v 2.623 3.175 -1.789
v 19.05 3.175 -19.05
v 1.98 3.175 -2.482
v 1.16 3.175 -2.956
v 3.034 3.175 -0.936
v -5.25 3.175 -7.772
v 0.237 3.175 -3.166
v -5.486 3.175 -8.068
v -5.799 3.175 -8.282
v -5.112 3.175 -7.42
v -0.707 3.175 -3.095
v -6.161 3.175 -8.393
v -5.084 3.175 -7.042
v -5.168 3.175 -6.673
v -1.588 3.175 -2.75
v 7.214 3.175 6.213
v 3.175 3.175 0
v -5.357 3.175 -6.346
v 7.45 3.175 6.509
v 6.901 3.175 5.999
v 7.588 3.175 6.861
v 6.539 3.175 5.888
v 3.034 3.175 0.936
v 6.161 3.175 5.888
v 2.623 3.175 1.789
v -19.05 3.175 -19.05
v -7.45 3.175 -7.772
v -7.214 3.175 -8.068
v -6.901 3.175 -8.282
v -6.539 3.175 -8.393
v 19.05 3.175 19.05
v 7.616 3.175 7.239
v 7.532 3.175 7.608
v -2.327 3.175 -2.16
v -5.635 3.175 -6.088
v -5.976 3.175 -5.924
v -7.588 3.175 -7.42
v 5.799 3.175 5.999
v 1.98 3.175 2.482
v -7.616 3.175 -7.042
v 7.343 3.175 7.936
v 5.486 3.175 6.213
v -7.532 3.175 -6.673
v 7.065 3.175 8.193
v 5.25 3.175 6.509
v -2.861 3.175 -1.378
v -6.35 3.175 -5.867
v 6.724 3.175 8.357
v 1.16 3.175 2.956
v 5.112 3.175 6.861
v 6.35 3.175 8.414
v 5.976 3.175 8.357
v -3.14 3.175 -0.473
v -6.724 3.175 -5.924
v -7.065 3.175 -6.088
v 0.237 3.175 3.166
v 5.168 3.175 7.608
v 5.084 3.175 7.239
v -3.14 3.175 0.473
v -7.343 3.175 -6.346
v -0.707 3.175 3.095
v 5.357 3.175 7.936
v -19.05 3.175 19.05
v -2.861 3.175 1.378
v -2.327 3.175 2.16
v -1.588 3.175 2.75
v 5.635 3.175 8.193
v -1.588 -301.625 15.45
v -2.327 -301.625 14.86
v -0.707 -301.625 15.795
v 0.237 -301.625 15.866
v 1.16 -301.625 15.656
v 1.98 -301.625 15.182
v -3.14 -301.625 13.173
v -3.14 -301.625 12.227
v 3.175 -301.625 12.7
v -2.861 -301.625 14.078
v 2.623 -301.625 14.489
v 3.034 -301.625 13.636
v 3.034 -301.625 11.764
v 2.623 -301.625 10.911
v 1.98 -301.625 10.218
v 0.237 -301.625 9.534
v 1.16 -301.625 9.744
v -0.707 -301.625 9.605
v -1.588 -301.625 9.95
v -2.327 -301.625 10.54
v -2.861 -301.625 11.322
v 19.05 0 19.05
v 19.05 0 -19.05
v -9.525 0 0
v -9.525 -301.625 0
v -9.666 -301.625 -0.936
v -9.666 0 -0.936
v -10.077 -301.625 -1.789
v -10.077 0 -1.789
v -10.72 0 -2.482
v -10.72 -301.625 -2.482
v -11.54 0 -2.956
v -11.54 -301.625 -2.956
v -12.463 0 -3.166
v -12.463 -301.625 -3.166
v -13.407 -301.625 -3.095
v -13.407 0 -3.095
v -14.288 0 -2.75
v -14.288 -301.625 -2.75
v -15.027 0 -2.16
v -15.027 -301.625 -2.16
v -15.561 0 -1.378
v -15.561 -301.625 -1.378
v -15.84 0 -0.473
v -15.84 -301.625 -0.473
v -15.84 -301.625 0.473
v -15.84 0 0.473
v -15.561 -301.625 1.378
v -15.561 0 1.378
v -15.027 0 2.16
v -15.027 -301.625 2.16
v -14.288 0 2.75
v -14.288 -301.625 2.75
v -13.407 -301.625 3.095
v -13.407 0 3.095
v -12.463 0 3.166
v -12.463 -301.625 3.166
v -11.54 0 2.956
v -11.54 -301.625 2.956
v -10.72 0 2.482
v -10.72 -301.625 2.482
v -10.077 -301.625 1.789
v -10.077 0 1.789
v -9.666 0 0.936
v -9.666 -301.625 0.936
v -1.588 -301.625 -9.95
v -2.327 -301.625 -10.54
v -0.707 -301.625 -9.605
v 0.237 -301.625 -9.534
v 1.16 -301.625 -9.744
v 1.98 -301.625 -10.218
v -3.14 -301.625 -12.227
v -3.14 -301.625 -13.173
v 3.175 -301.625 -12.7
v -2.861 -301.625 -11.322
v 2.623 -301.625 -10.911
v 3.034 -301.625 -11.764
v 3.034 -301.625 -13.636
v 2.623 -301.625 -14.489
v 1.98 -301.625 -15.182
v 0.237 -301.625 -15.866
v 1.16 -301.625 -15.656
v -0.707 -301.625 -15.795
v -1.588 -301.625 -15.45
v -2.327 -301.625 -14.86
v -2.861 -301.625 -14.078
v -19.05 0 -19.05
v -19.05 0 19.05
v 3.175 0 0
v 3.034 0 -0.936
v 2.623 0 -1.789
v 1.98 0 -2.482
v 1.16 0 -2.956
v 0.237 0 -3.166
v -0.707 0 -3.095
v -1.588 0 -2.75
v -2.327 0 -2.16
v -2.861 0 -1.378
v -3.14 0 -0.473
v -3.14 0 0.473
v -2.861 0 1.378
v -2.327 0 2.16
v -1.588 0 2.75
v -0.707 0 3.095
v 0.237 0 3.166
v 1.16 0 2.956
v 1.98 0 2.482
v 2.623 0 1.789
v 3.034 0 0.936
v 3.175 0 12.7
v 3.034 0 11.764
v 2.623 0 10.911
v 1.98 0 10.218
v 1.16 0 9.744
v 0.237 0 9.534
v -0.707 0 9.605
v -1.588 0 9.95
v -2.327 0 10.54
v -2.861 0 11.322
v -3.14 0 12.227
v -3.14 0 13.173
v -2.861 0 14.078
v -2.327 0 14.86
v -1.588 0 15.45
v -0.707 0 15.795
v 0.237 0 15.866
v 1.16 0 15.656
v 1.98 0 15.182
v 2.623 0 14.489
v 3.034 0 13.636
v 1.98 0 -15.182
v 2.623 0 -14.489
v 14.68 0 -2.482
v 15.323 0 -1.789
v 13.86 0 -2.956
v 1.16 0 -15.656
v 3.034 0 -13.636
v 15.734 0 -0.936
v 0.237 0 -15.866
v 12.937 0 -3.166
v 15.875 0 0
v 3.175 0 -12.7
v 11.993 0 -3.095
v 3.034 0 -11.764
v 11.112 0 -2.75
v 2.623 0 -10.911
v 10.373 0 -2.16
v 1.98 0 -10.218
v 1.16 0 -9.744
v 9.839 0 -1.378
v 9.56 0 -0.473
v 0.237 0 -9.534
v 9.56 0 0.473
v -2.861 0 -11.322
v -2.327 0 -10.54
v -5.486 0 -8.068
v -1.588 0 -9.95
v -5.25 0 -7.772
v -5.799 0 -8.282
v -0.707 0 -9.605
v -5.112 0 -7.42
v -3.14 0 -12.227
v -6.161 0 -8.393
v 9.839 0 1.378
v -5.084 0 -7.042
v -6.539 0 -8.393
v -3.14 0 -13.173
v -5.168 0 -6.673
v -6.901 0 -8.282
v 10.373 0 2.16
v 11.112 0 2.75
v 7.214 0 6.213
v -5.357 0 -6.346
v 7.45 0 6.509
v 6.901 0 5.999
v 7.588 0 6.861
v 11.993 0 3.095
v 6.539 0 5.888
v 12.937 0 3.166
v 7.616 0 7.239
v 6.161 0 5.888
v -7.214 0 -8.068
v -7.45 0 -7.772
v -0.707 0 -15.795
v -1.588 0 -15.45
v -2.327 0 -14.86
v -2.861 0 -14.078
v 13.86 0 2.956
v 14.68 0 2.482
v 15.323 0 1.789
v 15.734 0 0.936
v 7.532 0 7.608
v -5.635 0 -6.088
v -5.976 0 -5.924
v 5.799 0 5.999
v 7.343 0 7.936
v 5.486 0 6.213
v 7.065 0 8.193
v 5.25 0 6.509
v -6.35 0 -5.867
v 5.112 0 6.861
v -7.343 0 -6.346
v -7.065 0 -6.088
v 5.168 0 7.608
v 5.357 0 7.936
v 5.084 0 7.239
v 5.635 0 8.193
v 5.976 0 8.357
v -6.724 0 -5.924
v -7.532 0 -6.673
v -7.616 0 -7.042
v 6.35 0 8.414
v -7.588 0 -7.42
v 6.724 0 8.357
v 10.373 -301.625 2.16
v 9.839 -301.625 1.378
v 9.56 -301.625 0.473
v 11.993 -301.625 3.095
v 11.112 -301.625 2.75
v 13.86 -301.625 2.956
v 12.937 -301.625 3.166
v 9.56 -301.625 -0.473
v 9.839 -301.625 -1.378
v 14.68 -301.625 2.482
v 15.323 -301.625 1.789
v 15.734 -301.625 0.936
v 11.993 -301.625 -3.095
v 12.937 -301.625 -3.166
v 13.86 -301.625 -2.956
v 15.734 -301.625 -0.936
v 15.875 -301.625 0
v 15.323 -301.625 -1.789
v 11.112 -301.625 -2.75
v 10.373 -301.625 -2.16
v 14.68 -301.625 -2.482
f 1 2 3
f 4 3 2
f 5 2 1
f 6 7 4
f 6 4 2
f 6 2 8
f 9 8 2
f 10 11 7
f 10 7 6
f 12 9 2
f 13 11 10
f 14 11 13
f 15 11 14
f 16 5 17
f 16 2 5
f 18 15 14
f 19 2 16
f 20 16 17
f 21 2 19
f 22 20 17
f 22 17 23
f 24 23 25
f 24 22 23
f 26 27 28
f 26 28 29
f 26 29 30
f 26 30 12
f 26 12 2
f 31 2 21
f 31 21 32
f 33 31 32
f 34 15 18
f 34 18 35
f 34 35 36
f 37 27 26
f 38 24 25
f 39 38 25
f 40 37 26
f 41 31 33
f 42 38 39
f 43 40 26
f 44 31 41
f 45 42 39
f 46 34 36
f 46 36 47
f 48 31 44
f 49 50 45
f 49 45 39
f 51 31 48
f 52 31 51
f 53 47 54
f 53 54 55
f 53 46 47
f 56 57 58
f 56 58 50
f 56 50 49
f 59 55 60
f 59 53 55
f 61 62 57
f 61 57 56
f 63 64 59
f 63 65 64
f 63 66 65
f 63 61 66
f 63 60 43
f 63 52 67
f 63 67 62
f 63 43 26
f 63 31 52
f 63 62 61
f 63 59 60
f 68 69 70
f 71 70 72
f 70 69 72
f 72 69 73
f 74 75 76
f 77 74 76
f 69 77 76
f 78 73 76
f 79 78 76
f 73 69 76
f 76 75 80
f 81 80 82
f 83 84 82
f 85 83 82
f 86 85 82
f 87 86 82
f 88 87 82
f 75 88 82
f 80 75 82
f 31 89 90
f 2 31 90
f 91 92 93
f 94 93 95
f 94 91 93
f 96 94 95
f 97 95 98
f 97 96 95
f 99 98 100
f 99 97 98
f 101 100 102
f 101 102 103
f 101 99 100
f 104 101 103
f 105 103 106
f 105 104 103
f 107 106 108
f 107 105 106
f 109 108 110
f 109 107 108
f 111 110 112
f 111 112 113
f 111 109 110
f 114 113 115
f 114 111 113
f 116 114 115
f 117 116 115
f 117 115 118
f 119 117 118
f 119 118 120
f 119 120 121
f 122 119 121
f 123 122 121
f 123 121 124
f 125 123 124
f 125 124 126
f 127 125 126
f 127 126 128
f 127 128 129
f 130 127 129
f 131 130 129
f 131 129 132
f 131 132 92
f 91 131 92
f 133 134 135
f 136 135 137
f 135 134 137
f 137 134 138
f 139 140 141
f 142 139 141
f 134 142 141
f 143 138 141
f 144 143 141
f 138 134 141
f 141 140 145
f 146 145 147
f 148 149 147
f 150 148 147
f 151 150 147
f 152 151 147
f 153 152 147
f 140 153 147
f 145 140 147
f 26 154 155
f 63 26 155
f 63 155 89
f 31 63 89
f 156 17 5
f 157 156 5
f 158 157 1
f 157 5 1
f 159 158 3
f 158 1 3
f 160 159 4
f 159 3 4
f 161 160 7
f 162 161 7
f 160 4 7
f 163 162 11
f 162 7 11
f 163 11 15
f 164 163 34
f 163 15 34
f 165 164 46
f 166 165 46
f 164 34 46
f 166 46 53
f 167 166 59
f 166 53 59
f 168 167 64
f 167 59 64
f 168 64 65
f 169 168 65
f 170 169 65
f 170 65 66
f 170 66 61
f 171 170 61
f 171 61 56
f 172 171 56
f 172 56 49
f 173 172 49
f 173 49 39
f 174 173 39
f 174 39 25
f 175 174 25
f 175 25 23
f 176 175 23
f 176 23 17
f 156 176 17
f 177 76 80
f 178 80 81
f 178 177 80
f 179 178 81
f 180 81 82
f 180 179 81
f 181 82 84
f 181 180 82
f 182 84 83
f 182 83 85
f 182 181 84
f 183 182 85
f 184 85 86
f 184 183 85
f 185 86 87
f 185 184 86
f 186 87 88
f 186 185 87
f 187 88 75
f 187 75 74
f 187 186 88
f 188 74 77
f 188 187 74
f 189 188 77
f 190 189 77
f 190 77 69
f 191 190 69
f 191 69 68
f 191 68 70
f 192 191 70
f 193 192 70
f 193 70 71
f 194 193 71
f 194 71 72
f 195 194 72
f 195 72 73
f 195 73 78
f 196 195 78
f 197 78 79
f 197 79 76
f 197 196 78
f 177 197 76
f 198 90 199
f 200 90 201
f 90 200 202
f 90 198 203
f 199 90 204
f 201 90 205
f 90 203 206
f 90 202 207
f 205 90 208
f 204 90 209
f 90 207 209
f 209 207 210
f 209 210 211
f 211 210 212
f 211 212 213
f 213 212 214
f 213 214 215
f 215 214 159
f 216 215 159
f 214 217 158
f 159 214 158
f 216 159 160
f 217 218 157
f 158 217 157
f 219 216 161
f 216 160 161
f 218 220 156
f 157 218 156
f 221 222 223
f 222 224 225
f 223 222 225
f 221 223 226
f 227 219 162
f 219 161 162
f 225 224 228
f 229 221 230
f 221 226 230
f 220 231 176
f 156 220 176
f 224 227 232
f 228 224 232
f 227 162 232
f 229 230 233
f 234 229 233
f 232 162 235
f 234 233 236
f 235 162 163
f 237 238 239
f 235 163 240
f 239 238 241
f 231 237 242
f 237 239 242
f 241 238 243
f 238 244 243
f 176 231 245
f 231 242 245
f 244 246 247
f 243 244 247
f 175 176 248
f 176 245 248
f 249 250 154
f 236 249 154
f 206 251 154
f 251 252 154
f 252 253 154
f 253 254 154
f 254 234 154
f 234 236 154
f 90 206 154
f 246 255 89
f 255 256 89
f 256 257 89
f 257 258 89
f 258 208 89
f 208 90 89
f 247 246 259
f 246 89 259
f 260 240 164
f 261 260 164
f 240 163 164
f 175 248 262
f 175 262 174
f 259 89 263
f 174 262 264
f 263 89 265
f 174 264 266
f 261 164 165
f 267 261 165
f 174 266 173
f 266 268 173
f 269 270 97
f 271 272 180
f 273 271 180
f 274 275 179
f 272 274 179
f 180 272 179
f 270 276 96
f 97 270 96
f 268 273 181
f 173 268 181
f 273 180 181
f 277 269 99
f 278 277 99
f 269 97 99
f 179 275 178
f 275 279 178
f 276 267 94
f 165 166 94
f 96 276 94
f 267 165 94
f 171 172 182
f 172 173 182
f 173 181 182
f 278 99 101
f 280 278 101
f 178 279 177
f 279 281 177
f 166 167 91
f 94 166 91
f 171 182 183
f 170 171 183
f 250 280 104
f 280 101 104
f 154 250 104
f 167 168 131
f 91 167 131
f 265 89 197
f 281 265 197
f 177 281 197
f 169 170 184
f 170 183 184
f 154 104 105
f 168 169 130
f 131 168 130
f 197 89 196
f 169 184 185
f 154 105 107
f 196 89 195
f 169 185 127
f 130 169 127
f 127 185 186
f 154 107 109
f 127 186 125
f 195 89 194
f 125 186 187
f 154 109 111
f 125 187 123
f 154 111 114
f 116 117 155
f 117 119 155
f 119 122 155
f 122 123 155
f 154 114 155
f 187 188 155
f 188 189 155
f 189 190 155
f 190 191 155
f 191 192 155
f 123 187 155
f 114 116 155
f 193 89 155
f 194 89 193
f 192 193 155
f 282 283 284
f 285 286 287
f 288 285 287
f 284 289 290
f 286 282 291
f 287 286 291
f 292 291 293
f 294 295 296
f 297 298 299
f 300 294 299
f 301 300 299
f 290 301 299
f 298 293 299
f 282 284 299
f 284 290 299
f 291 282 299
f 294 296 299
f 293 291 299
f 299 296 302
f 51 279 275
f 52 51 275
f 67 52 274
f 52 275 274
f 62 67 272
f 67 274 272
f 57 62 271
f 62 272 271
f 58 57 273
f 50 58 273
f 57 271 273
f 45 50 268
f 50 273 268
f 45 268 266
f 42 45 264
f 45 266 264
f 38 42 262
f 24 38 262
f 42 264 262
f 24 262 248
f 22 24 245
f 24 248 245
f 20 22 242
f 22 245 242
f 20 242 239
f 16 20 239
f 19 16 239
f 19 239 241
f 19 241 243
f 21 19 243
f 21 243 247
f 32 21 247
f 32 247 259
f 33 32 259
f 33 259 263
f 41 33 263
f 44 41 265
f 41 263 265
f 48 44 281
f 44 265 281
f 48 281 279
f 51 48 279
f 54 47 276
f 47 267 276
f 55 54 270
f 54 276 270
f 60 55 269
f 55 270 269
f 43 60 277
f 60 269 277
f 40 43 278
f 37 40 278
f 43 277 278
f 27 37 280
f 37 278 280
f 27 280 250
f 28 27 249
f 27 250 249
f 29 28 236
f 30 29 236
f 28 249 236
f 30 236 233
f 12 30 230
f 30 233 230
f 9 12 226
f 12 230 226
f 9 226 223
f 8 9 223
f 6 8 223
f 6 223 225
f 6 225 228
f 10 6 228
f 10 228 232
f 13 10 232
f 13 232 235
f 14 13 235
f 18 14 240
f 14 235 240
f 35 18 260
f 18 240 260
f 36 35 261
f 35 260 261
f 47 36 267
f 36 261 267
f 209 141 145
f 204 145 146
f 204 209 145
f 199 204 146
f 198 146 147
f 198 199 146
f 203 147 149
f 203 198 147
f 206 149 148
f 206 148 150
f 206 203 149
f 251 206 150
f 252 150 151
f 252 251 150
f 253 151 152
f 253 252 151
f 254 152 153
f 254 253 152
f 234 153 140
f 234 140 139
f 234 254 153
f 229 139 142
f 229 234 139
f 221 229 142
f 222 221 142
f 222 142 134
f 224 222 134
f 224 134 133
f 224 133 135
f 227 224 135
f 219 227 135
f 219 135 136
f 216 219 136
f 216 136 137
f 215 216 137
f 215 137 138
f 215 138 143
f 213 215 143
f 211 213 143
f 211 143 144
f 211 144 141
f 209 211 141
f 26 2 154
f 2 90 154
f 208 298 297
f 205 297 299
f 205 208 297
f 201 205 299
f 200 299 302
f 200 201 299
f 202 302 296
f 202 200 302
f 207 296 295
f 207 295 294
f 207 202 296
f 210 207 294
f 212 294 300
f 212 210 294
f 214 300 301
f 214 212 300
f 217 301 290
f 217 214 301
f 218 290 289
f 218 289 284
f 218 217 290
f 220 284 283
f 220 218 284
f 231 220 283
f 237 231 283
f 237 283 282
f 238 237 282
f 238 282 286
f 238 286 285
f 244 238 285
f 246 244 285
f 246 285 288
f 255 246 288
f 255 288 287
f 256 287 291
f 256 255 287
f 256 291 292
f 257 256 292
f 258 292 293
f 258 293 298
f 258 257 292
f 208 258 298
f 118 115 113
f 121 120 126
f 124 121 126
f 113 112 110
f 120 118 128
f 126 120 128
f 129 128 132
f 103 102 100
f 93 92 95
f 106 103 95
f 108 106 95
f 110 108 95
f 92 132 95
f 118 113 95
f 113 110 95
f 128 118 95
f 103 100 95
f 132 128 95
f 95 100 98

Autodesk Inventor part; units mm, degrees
ref_plane "YZ Plane" through (0, 0, 0) normal (1, 0, 0) x (0, 1, 0)
ref_plane "XZ Plane" through (0, 0, 0) normal (0, 1, 0) x (-1, 0, 0)
ref_plane "XY Plane" through (0, 0, 0) normal (0, 0, 1) x (1, 0, 0)
sketch "Sketch1" plane through (0, 0, 0) normal (0, 1, 0) x (-1, 0, 0)
  line L0 (19.05, 19.05) -> (-19.05, 19.05)
  line L1 (-19.05, 19.05) -> (-19.05, -19.05)
  line L2 (-19.05, -19.05) -> (19.05, -19.05)
  line L3 (19.05, -19.05) -> (19.05, 19.05)
  point P0 (0, 0)
  dimension "d0" = 38.1
  dimension "d1" = 38.1
  dimension "d77" = 19.05
  dimension "d78" = 19.05
extrude "Extrusion1" add sketch "Sketch1" along normal blind 3.175
hole "Hole5" at (-6.35, 3.175, -7.1374) direction (0, -1, 0) diameter 2.54 depth 3.175
hole "Hole6" at (6.35, 3.175, 7.1437) direction (0, -1, 0) diameter 2.54 depth 3.175
sketch "Sketch2" plane through (0, 3.175, 0) normal (0, 1, 0) x (1, 0, 0)
  circle A0 centre (0, 0) radius 3.175
  dimension "d58" = 6.35
extrude "Extrusion2" cut sketch "Sketch2" against normal blind 304.8
sketch "Sketch7" plane through (0, 3.175, 0) normal (0, 1, 0) x (1, 0, 0)
  circle A0 centre (0, 0) radius 19.05
  circle A1 centre (0, 12.7) radius 3.175
  circle A2 centre (0, 0) radius 12.7
  circle A3 centre (0, 0) radius 3.175
  circle A4 centre (-12.7, 0) radius 3.175
  circle A5 centre (0, -12.7) radius 3.175
  circle A6 centre (12.7, 0) radius 3.175
  dimension "d71" = 38.1
  dimension "d72" = 6.35
  dimension "d73" = 25.4
  dimension "d74" = 12.7
  dimension "d75" = 6.35
  dimension "d76" = 360
extrude "Extrusion7" add sketch "Sketch7" against normal blind 304.8 contours A1 A2 | A2 A1 | A4 A2 | A2 A4 | A6 A2 | A2 A6 | A5 A2 | A2 A5
properties part number "Shield_1"
